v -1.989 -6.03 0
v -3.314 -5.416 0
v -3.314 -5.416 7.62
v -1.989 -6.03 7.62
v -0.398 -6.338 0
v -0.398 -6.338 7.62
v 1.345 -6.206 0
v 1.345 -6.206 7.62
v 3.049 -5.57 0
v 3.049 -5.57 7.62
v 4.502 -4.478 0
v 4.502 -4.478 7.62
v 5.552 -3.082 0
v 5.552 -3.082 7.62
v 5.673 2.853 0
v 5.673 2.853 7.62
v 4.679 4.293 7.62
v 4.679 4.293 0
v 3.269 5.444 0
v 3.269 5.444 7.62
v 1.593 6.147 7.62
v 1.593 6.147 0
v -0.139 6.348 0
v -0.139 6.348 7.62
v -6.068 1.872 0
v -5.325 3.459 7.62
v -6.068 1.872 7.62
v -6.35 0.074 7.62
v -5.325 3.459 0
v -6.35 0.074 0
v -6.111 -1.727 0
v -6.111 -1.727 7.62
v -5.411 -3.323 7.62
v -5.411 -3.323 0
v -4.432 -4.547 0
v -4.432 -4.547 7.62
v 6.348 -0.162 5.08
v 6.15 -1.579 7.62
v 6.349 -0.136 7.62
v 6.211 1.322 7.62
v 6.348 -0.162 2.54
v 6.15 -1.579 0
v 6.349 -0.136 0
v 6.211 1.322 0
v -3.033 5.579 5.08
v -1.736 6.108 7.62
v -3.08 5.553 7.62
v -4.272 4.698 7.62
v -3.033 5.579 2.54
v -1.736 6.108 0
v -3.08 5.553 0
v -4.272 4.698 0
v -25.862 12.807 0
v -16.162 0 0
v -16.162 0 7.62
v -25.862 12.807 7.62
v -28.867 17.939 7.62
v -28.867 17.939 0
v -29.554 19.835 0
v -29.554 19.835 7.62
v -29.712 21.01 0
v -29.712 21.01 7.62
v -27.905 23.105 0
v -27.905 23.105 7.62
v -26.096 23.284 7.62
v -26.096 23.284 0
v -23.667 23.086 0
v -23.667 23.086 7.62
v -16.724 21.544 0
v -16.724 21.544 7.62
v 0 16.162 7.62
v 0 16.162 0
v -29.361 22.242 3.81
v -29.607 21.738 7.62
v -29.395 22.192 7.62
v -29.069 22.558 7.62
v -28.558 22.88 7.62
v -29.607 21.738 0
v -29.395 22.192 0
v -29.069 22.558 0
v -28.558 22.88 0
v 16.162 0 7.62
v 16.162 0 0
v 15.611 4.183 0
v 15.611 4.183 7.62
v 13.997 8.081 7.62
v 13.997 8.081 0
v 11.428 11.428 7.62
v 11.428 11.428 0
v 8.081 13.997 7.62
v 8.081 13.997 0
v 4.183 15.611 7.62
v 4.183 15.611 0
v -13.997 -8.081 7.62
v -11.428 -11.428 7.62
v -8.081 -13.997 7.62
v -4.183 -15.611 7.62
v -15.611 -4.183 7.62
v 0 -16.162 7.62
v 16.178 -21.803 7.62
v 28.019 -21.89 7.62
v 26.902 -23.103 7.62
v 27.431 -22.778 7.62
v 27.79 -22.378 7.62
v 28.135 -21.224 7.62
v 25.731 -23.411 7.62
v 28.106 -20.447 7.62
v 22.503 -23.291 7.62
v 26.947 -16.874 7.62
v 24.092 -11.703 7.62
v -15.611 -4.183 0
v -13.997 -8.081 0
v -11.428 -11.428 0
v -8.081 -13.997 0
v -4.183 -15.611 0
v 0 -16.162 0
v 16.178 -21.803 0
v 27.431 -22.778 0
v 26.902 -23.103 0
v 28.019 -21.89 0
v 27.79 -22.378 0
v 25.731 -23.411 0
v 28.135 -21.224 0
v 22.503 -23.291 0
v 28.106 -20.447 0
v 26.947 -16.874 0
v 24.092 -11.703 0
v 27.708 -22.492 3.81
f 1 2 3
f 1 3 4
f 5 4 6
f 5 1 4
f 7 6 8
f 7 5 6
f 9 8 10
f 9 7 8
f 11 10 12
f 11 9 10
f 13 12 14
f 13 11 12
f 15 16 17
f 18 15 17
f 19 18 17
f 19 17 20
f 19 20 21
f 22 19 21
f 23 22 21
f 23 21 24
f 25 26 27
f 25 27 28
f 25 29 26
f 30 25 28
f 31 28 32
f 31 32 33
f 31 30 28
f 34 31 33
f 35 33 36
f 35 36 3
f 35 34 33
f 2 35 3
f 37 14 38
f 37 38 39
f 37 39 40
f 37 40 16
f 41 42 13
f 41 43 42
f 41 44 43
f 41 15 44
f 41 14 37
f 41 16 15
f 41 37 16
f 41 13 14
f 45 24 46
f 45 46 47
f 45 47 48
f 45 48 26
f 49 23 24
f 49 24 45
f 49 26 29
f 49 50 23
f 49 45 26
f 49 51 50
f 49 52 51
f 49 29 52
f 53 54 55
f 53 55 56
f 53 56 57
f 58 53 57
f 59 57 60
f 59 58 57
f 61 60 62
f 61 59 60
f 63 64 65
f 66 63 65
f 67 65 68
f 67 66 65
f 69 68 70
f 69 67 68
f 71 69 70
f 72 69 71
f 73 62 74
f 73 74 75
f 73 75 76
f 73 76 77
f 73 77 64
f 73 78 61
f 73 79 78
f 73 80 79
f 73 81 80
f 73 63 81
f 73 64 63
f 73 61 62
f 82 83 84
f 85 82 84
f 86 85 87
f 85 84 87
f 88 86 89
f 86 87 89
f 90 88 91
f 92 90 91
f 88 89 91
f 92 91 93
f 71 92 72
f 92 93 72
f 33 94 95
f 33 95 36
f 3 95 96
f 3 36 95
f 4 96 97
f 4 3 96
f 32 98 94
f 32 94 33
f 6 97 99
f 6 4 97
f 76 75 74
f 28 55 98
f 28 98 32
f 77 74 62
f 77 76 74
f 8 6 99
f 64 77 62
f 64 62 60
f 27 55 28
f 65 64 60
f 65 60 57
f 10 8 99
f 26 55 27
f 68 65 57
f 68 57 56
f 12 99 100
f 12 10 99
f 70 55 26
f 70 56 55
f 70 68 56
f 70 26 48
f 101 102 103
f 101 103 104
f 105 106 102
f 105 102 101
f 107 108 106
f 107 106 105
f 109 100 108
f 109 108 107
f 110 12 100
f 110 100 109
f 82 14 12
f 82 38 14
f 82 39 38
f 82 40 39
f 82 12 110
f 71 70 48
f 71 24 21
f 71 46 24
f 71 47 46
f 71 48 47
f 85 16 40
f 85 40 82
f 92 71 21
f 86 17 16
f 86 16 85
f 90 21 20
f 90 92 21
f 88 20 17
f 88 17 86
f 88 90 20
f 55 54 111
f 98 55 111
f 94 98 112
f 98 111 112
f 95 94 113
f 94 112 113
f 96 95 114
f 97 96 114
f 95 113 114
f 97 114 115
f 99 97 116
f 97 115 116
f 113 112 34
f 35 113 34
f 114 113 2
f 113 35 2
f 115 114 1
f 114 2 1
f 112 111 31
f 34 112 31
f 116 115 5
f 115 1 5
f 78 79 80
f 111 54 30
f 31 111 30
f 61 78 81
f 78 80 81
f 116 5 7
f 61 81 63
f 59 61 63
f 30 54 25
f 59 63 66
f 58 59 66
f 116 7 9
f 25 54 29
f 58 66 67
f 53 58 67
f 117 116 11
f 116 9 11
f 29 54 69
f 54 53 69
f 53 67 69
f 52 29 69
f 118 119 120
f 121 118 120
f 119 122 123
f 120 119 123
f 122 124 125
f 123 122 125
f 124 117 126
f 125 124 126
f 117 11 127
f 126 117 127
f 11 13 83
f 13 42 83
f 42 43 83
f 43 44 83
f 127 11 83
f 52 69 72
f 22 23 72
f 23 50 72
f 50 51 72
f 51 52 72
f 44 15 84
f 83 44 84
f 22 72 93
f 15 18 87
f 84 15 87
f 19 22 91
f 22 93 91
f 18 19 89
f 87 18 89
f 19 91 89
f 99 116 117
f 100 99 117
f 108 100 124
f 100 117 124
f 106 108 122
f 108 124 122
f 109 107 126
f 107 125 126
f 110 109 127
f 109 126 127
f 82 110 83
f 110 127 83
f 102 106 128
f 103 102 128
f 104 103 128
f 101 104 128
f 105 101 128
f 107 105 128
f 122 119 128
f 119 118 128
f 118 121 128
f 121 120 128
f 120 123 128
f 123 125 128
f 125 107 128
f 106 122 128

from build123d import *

# Parameters (mm, degrees)
F1_DEPTH = 7.62


with BuildPart() as f1:
    # F0 (on Top) → F1 (new body)
    with BuildSketch(Plane.XY):
        with BuildLine():
            ThreePointArc((0, -16.1618834375), (11.4281773754, -11.4281773754), (16.1618834375, 0))
            ThreePointArc((16.1618834375, 0), (11.4281773754, 11.4281773754), (0, 16.1618834375))
            ThreePointArc((0, 16.1618834375), (-11.4281773754, 11.4281773754), (-16.1618834375, 0))
            ThreePointArc((-16.1618834375, 0), (-11.4281773754, -11.4281773754), (0, -16.1618834375))
        make_face()
        with BuildLine():
            add(Edge.make_bspline(
                [(-3.3144769964, -5.4163402996), (6.0668995936, -11.1571828578), (6.3479267931, -0.1622511293), (6.6289539927, 10.8326805991), (-3.0334497968, 5.5785914289), (-12.6958535863, 0.3245022587), (-3.3144769964, -5.4163402996)],
                knots=[0, 0, 0, 2.0943951024, 2.0943951024, 4.1887902048, 4.1887902048, 6.2831853072, 6.2831853072, 6.2831853072], degree=2, weights=[1, 0.5, 1, 0.5, 1, 0.5, 1]))
        make_face(mode=Mode.SUBTRACT)
        with BuildLine():
            add(Edge.make_bspline(
                [(0, -16.1618834375), (12.6628212145, -20.8602689442), (37.2685869177, -29.9899384705), (23.0588761543, -9.7997485682), (16.1618834375, 0)],
                knots=[0, 0, 0, 0, 0.5146282122, 1, 1, 1, 1], degree=3))
            ThreePointArc((16.1618834375, 0), (11.4281773754, -11.4281773754), (0, -16.1618834375))
        make_face()
        with BuildLine():
            ThreePointArc((-16.1618834375, 0), (-11.4281773754, 11.4281773754), (0, 16.1618834375))
            add(Edge.make_bspline(
                [(-16.1618834375, 0), (-23.80915812, 9.6523844252), (-39.6902992808, 29.6975490047), (-13.5519187742, 20.7835225696), (0, 16.1618834375)],
                knots=[0, 0, 0, 0, 0.4815318122, 1, 1, 1, 1], degree=3))
        make_face()
    extrude(amount=F1_DEPTH)


solid = f1.part
